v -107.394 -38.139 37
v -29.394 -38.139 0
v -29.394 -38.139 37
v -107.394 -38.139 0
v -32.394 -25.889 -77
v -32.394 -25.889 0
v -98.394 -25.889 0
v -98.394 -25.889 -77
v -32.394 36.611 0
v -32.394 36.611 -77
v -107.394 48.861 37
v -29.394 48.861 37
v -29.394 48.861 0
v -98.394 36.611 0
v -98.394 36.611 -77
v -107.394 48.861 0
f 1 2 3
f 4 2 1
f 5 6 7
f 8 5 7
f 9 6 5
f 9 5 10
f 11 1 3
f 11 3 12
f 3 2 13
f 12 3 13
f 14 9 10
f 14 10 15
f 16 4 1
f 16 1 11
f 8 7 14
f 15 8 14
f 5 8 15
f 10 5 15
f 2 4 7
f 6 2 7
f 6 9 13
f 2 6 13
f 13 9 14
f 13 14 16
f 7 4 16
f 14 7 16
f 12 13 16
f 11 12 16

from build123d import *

# Parameters (mm, degrees)
F0_W     = 87
F0_H     = 78
F0_W_2   = 62.5
F0_H_2   = 66
F1_DEPTH = 37
F2_DEPTH = 77
F3_ANGLE = 90


with BuildPart() as f1:
    # F0 (on Top) → F1 (new body)
    with BuildSketch(Plane.XY):
        with Locations((-1.143673, 10.111042)):
            Rectangle(F0_W, F0_H)
        with Locations((-1.143673, 7.111042)):
            Rectangle(F0_W_2, F0_H_2, mode=Mode.SUBTRACT)
        with Locations((-1.143673, 7.111042)):
            Rectangle(F0_W_2, F0_H_2)
    extrude(amount=F1_DEPTH)

    # F0 (on Top) → F2 (join)
    with BuildSketch(Plane.XY):
        with Locations((-1.143673, 7.111042)):
            Rectangle(F0_W_2, F0_H_2)
    extrude(amount=-F2_DEPTH)


with BuildPart() as f1_1:
    # F3: moved
    add(f1.part.rotate(Axis((-32.393673, -25.888958, -38.5), (0, 0, 1)), F3_ANGLE))


solid = f1_1.part
